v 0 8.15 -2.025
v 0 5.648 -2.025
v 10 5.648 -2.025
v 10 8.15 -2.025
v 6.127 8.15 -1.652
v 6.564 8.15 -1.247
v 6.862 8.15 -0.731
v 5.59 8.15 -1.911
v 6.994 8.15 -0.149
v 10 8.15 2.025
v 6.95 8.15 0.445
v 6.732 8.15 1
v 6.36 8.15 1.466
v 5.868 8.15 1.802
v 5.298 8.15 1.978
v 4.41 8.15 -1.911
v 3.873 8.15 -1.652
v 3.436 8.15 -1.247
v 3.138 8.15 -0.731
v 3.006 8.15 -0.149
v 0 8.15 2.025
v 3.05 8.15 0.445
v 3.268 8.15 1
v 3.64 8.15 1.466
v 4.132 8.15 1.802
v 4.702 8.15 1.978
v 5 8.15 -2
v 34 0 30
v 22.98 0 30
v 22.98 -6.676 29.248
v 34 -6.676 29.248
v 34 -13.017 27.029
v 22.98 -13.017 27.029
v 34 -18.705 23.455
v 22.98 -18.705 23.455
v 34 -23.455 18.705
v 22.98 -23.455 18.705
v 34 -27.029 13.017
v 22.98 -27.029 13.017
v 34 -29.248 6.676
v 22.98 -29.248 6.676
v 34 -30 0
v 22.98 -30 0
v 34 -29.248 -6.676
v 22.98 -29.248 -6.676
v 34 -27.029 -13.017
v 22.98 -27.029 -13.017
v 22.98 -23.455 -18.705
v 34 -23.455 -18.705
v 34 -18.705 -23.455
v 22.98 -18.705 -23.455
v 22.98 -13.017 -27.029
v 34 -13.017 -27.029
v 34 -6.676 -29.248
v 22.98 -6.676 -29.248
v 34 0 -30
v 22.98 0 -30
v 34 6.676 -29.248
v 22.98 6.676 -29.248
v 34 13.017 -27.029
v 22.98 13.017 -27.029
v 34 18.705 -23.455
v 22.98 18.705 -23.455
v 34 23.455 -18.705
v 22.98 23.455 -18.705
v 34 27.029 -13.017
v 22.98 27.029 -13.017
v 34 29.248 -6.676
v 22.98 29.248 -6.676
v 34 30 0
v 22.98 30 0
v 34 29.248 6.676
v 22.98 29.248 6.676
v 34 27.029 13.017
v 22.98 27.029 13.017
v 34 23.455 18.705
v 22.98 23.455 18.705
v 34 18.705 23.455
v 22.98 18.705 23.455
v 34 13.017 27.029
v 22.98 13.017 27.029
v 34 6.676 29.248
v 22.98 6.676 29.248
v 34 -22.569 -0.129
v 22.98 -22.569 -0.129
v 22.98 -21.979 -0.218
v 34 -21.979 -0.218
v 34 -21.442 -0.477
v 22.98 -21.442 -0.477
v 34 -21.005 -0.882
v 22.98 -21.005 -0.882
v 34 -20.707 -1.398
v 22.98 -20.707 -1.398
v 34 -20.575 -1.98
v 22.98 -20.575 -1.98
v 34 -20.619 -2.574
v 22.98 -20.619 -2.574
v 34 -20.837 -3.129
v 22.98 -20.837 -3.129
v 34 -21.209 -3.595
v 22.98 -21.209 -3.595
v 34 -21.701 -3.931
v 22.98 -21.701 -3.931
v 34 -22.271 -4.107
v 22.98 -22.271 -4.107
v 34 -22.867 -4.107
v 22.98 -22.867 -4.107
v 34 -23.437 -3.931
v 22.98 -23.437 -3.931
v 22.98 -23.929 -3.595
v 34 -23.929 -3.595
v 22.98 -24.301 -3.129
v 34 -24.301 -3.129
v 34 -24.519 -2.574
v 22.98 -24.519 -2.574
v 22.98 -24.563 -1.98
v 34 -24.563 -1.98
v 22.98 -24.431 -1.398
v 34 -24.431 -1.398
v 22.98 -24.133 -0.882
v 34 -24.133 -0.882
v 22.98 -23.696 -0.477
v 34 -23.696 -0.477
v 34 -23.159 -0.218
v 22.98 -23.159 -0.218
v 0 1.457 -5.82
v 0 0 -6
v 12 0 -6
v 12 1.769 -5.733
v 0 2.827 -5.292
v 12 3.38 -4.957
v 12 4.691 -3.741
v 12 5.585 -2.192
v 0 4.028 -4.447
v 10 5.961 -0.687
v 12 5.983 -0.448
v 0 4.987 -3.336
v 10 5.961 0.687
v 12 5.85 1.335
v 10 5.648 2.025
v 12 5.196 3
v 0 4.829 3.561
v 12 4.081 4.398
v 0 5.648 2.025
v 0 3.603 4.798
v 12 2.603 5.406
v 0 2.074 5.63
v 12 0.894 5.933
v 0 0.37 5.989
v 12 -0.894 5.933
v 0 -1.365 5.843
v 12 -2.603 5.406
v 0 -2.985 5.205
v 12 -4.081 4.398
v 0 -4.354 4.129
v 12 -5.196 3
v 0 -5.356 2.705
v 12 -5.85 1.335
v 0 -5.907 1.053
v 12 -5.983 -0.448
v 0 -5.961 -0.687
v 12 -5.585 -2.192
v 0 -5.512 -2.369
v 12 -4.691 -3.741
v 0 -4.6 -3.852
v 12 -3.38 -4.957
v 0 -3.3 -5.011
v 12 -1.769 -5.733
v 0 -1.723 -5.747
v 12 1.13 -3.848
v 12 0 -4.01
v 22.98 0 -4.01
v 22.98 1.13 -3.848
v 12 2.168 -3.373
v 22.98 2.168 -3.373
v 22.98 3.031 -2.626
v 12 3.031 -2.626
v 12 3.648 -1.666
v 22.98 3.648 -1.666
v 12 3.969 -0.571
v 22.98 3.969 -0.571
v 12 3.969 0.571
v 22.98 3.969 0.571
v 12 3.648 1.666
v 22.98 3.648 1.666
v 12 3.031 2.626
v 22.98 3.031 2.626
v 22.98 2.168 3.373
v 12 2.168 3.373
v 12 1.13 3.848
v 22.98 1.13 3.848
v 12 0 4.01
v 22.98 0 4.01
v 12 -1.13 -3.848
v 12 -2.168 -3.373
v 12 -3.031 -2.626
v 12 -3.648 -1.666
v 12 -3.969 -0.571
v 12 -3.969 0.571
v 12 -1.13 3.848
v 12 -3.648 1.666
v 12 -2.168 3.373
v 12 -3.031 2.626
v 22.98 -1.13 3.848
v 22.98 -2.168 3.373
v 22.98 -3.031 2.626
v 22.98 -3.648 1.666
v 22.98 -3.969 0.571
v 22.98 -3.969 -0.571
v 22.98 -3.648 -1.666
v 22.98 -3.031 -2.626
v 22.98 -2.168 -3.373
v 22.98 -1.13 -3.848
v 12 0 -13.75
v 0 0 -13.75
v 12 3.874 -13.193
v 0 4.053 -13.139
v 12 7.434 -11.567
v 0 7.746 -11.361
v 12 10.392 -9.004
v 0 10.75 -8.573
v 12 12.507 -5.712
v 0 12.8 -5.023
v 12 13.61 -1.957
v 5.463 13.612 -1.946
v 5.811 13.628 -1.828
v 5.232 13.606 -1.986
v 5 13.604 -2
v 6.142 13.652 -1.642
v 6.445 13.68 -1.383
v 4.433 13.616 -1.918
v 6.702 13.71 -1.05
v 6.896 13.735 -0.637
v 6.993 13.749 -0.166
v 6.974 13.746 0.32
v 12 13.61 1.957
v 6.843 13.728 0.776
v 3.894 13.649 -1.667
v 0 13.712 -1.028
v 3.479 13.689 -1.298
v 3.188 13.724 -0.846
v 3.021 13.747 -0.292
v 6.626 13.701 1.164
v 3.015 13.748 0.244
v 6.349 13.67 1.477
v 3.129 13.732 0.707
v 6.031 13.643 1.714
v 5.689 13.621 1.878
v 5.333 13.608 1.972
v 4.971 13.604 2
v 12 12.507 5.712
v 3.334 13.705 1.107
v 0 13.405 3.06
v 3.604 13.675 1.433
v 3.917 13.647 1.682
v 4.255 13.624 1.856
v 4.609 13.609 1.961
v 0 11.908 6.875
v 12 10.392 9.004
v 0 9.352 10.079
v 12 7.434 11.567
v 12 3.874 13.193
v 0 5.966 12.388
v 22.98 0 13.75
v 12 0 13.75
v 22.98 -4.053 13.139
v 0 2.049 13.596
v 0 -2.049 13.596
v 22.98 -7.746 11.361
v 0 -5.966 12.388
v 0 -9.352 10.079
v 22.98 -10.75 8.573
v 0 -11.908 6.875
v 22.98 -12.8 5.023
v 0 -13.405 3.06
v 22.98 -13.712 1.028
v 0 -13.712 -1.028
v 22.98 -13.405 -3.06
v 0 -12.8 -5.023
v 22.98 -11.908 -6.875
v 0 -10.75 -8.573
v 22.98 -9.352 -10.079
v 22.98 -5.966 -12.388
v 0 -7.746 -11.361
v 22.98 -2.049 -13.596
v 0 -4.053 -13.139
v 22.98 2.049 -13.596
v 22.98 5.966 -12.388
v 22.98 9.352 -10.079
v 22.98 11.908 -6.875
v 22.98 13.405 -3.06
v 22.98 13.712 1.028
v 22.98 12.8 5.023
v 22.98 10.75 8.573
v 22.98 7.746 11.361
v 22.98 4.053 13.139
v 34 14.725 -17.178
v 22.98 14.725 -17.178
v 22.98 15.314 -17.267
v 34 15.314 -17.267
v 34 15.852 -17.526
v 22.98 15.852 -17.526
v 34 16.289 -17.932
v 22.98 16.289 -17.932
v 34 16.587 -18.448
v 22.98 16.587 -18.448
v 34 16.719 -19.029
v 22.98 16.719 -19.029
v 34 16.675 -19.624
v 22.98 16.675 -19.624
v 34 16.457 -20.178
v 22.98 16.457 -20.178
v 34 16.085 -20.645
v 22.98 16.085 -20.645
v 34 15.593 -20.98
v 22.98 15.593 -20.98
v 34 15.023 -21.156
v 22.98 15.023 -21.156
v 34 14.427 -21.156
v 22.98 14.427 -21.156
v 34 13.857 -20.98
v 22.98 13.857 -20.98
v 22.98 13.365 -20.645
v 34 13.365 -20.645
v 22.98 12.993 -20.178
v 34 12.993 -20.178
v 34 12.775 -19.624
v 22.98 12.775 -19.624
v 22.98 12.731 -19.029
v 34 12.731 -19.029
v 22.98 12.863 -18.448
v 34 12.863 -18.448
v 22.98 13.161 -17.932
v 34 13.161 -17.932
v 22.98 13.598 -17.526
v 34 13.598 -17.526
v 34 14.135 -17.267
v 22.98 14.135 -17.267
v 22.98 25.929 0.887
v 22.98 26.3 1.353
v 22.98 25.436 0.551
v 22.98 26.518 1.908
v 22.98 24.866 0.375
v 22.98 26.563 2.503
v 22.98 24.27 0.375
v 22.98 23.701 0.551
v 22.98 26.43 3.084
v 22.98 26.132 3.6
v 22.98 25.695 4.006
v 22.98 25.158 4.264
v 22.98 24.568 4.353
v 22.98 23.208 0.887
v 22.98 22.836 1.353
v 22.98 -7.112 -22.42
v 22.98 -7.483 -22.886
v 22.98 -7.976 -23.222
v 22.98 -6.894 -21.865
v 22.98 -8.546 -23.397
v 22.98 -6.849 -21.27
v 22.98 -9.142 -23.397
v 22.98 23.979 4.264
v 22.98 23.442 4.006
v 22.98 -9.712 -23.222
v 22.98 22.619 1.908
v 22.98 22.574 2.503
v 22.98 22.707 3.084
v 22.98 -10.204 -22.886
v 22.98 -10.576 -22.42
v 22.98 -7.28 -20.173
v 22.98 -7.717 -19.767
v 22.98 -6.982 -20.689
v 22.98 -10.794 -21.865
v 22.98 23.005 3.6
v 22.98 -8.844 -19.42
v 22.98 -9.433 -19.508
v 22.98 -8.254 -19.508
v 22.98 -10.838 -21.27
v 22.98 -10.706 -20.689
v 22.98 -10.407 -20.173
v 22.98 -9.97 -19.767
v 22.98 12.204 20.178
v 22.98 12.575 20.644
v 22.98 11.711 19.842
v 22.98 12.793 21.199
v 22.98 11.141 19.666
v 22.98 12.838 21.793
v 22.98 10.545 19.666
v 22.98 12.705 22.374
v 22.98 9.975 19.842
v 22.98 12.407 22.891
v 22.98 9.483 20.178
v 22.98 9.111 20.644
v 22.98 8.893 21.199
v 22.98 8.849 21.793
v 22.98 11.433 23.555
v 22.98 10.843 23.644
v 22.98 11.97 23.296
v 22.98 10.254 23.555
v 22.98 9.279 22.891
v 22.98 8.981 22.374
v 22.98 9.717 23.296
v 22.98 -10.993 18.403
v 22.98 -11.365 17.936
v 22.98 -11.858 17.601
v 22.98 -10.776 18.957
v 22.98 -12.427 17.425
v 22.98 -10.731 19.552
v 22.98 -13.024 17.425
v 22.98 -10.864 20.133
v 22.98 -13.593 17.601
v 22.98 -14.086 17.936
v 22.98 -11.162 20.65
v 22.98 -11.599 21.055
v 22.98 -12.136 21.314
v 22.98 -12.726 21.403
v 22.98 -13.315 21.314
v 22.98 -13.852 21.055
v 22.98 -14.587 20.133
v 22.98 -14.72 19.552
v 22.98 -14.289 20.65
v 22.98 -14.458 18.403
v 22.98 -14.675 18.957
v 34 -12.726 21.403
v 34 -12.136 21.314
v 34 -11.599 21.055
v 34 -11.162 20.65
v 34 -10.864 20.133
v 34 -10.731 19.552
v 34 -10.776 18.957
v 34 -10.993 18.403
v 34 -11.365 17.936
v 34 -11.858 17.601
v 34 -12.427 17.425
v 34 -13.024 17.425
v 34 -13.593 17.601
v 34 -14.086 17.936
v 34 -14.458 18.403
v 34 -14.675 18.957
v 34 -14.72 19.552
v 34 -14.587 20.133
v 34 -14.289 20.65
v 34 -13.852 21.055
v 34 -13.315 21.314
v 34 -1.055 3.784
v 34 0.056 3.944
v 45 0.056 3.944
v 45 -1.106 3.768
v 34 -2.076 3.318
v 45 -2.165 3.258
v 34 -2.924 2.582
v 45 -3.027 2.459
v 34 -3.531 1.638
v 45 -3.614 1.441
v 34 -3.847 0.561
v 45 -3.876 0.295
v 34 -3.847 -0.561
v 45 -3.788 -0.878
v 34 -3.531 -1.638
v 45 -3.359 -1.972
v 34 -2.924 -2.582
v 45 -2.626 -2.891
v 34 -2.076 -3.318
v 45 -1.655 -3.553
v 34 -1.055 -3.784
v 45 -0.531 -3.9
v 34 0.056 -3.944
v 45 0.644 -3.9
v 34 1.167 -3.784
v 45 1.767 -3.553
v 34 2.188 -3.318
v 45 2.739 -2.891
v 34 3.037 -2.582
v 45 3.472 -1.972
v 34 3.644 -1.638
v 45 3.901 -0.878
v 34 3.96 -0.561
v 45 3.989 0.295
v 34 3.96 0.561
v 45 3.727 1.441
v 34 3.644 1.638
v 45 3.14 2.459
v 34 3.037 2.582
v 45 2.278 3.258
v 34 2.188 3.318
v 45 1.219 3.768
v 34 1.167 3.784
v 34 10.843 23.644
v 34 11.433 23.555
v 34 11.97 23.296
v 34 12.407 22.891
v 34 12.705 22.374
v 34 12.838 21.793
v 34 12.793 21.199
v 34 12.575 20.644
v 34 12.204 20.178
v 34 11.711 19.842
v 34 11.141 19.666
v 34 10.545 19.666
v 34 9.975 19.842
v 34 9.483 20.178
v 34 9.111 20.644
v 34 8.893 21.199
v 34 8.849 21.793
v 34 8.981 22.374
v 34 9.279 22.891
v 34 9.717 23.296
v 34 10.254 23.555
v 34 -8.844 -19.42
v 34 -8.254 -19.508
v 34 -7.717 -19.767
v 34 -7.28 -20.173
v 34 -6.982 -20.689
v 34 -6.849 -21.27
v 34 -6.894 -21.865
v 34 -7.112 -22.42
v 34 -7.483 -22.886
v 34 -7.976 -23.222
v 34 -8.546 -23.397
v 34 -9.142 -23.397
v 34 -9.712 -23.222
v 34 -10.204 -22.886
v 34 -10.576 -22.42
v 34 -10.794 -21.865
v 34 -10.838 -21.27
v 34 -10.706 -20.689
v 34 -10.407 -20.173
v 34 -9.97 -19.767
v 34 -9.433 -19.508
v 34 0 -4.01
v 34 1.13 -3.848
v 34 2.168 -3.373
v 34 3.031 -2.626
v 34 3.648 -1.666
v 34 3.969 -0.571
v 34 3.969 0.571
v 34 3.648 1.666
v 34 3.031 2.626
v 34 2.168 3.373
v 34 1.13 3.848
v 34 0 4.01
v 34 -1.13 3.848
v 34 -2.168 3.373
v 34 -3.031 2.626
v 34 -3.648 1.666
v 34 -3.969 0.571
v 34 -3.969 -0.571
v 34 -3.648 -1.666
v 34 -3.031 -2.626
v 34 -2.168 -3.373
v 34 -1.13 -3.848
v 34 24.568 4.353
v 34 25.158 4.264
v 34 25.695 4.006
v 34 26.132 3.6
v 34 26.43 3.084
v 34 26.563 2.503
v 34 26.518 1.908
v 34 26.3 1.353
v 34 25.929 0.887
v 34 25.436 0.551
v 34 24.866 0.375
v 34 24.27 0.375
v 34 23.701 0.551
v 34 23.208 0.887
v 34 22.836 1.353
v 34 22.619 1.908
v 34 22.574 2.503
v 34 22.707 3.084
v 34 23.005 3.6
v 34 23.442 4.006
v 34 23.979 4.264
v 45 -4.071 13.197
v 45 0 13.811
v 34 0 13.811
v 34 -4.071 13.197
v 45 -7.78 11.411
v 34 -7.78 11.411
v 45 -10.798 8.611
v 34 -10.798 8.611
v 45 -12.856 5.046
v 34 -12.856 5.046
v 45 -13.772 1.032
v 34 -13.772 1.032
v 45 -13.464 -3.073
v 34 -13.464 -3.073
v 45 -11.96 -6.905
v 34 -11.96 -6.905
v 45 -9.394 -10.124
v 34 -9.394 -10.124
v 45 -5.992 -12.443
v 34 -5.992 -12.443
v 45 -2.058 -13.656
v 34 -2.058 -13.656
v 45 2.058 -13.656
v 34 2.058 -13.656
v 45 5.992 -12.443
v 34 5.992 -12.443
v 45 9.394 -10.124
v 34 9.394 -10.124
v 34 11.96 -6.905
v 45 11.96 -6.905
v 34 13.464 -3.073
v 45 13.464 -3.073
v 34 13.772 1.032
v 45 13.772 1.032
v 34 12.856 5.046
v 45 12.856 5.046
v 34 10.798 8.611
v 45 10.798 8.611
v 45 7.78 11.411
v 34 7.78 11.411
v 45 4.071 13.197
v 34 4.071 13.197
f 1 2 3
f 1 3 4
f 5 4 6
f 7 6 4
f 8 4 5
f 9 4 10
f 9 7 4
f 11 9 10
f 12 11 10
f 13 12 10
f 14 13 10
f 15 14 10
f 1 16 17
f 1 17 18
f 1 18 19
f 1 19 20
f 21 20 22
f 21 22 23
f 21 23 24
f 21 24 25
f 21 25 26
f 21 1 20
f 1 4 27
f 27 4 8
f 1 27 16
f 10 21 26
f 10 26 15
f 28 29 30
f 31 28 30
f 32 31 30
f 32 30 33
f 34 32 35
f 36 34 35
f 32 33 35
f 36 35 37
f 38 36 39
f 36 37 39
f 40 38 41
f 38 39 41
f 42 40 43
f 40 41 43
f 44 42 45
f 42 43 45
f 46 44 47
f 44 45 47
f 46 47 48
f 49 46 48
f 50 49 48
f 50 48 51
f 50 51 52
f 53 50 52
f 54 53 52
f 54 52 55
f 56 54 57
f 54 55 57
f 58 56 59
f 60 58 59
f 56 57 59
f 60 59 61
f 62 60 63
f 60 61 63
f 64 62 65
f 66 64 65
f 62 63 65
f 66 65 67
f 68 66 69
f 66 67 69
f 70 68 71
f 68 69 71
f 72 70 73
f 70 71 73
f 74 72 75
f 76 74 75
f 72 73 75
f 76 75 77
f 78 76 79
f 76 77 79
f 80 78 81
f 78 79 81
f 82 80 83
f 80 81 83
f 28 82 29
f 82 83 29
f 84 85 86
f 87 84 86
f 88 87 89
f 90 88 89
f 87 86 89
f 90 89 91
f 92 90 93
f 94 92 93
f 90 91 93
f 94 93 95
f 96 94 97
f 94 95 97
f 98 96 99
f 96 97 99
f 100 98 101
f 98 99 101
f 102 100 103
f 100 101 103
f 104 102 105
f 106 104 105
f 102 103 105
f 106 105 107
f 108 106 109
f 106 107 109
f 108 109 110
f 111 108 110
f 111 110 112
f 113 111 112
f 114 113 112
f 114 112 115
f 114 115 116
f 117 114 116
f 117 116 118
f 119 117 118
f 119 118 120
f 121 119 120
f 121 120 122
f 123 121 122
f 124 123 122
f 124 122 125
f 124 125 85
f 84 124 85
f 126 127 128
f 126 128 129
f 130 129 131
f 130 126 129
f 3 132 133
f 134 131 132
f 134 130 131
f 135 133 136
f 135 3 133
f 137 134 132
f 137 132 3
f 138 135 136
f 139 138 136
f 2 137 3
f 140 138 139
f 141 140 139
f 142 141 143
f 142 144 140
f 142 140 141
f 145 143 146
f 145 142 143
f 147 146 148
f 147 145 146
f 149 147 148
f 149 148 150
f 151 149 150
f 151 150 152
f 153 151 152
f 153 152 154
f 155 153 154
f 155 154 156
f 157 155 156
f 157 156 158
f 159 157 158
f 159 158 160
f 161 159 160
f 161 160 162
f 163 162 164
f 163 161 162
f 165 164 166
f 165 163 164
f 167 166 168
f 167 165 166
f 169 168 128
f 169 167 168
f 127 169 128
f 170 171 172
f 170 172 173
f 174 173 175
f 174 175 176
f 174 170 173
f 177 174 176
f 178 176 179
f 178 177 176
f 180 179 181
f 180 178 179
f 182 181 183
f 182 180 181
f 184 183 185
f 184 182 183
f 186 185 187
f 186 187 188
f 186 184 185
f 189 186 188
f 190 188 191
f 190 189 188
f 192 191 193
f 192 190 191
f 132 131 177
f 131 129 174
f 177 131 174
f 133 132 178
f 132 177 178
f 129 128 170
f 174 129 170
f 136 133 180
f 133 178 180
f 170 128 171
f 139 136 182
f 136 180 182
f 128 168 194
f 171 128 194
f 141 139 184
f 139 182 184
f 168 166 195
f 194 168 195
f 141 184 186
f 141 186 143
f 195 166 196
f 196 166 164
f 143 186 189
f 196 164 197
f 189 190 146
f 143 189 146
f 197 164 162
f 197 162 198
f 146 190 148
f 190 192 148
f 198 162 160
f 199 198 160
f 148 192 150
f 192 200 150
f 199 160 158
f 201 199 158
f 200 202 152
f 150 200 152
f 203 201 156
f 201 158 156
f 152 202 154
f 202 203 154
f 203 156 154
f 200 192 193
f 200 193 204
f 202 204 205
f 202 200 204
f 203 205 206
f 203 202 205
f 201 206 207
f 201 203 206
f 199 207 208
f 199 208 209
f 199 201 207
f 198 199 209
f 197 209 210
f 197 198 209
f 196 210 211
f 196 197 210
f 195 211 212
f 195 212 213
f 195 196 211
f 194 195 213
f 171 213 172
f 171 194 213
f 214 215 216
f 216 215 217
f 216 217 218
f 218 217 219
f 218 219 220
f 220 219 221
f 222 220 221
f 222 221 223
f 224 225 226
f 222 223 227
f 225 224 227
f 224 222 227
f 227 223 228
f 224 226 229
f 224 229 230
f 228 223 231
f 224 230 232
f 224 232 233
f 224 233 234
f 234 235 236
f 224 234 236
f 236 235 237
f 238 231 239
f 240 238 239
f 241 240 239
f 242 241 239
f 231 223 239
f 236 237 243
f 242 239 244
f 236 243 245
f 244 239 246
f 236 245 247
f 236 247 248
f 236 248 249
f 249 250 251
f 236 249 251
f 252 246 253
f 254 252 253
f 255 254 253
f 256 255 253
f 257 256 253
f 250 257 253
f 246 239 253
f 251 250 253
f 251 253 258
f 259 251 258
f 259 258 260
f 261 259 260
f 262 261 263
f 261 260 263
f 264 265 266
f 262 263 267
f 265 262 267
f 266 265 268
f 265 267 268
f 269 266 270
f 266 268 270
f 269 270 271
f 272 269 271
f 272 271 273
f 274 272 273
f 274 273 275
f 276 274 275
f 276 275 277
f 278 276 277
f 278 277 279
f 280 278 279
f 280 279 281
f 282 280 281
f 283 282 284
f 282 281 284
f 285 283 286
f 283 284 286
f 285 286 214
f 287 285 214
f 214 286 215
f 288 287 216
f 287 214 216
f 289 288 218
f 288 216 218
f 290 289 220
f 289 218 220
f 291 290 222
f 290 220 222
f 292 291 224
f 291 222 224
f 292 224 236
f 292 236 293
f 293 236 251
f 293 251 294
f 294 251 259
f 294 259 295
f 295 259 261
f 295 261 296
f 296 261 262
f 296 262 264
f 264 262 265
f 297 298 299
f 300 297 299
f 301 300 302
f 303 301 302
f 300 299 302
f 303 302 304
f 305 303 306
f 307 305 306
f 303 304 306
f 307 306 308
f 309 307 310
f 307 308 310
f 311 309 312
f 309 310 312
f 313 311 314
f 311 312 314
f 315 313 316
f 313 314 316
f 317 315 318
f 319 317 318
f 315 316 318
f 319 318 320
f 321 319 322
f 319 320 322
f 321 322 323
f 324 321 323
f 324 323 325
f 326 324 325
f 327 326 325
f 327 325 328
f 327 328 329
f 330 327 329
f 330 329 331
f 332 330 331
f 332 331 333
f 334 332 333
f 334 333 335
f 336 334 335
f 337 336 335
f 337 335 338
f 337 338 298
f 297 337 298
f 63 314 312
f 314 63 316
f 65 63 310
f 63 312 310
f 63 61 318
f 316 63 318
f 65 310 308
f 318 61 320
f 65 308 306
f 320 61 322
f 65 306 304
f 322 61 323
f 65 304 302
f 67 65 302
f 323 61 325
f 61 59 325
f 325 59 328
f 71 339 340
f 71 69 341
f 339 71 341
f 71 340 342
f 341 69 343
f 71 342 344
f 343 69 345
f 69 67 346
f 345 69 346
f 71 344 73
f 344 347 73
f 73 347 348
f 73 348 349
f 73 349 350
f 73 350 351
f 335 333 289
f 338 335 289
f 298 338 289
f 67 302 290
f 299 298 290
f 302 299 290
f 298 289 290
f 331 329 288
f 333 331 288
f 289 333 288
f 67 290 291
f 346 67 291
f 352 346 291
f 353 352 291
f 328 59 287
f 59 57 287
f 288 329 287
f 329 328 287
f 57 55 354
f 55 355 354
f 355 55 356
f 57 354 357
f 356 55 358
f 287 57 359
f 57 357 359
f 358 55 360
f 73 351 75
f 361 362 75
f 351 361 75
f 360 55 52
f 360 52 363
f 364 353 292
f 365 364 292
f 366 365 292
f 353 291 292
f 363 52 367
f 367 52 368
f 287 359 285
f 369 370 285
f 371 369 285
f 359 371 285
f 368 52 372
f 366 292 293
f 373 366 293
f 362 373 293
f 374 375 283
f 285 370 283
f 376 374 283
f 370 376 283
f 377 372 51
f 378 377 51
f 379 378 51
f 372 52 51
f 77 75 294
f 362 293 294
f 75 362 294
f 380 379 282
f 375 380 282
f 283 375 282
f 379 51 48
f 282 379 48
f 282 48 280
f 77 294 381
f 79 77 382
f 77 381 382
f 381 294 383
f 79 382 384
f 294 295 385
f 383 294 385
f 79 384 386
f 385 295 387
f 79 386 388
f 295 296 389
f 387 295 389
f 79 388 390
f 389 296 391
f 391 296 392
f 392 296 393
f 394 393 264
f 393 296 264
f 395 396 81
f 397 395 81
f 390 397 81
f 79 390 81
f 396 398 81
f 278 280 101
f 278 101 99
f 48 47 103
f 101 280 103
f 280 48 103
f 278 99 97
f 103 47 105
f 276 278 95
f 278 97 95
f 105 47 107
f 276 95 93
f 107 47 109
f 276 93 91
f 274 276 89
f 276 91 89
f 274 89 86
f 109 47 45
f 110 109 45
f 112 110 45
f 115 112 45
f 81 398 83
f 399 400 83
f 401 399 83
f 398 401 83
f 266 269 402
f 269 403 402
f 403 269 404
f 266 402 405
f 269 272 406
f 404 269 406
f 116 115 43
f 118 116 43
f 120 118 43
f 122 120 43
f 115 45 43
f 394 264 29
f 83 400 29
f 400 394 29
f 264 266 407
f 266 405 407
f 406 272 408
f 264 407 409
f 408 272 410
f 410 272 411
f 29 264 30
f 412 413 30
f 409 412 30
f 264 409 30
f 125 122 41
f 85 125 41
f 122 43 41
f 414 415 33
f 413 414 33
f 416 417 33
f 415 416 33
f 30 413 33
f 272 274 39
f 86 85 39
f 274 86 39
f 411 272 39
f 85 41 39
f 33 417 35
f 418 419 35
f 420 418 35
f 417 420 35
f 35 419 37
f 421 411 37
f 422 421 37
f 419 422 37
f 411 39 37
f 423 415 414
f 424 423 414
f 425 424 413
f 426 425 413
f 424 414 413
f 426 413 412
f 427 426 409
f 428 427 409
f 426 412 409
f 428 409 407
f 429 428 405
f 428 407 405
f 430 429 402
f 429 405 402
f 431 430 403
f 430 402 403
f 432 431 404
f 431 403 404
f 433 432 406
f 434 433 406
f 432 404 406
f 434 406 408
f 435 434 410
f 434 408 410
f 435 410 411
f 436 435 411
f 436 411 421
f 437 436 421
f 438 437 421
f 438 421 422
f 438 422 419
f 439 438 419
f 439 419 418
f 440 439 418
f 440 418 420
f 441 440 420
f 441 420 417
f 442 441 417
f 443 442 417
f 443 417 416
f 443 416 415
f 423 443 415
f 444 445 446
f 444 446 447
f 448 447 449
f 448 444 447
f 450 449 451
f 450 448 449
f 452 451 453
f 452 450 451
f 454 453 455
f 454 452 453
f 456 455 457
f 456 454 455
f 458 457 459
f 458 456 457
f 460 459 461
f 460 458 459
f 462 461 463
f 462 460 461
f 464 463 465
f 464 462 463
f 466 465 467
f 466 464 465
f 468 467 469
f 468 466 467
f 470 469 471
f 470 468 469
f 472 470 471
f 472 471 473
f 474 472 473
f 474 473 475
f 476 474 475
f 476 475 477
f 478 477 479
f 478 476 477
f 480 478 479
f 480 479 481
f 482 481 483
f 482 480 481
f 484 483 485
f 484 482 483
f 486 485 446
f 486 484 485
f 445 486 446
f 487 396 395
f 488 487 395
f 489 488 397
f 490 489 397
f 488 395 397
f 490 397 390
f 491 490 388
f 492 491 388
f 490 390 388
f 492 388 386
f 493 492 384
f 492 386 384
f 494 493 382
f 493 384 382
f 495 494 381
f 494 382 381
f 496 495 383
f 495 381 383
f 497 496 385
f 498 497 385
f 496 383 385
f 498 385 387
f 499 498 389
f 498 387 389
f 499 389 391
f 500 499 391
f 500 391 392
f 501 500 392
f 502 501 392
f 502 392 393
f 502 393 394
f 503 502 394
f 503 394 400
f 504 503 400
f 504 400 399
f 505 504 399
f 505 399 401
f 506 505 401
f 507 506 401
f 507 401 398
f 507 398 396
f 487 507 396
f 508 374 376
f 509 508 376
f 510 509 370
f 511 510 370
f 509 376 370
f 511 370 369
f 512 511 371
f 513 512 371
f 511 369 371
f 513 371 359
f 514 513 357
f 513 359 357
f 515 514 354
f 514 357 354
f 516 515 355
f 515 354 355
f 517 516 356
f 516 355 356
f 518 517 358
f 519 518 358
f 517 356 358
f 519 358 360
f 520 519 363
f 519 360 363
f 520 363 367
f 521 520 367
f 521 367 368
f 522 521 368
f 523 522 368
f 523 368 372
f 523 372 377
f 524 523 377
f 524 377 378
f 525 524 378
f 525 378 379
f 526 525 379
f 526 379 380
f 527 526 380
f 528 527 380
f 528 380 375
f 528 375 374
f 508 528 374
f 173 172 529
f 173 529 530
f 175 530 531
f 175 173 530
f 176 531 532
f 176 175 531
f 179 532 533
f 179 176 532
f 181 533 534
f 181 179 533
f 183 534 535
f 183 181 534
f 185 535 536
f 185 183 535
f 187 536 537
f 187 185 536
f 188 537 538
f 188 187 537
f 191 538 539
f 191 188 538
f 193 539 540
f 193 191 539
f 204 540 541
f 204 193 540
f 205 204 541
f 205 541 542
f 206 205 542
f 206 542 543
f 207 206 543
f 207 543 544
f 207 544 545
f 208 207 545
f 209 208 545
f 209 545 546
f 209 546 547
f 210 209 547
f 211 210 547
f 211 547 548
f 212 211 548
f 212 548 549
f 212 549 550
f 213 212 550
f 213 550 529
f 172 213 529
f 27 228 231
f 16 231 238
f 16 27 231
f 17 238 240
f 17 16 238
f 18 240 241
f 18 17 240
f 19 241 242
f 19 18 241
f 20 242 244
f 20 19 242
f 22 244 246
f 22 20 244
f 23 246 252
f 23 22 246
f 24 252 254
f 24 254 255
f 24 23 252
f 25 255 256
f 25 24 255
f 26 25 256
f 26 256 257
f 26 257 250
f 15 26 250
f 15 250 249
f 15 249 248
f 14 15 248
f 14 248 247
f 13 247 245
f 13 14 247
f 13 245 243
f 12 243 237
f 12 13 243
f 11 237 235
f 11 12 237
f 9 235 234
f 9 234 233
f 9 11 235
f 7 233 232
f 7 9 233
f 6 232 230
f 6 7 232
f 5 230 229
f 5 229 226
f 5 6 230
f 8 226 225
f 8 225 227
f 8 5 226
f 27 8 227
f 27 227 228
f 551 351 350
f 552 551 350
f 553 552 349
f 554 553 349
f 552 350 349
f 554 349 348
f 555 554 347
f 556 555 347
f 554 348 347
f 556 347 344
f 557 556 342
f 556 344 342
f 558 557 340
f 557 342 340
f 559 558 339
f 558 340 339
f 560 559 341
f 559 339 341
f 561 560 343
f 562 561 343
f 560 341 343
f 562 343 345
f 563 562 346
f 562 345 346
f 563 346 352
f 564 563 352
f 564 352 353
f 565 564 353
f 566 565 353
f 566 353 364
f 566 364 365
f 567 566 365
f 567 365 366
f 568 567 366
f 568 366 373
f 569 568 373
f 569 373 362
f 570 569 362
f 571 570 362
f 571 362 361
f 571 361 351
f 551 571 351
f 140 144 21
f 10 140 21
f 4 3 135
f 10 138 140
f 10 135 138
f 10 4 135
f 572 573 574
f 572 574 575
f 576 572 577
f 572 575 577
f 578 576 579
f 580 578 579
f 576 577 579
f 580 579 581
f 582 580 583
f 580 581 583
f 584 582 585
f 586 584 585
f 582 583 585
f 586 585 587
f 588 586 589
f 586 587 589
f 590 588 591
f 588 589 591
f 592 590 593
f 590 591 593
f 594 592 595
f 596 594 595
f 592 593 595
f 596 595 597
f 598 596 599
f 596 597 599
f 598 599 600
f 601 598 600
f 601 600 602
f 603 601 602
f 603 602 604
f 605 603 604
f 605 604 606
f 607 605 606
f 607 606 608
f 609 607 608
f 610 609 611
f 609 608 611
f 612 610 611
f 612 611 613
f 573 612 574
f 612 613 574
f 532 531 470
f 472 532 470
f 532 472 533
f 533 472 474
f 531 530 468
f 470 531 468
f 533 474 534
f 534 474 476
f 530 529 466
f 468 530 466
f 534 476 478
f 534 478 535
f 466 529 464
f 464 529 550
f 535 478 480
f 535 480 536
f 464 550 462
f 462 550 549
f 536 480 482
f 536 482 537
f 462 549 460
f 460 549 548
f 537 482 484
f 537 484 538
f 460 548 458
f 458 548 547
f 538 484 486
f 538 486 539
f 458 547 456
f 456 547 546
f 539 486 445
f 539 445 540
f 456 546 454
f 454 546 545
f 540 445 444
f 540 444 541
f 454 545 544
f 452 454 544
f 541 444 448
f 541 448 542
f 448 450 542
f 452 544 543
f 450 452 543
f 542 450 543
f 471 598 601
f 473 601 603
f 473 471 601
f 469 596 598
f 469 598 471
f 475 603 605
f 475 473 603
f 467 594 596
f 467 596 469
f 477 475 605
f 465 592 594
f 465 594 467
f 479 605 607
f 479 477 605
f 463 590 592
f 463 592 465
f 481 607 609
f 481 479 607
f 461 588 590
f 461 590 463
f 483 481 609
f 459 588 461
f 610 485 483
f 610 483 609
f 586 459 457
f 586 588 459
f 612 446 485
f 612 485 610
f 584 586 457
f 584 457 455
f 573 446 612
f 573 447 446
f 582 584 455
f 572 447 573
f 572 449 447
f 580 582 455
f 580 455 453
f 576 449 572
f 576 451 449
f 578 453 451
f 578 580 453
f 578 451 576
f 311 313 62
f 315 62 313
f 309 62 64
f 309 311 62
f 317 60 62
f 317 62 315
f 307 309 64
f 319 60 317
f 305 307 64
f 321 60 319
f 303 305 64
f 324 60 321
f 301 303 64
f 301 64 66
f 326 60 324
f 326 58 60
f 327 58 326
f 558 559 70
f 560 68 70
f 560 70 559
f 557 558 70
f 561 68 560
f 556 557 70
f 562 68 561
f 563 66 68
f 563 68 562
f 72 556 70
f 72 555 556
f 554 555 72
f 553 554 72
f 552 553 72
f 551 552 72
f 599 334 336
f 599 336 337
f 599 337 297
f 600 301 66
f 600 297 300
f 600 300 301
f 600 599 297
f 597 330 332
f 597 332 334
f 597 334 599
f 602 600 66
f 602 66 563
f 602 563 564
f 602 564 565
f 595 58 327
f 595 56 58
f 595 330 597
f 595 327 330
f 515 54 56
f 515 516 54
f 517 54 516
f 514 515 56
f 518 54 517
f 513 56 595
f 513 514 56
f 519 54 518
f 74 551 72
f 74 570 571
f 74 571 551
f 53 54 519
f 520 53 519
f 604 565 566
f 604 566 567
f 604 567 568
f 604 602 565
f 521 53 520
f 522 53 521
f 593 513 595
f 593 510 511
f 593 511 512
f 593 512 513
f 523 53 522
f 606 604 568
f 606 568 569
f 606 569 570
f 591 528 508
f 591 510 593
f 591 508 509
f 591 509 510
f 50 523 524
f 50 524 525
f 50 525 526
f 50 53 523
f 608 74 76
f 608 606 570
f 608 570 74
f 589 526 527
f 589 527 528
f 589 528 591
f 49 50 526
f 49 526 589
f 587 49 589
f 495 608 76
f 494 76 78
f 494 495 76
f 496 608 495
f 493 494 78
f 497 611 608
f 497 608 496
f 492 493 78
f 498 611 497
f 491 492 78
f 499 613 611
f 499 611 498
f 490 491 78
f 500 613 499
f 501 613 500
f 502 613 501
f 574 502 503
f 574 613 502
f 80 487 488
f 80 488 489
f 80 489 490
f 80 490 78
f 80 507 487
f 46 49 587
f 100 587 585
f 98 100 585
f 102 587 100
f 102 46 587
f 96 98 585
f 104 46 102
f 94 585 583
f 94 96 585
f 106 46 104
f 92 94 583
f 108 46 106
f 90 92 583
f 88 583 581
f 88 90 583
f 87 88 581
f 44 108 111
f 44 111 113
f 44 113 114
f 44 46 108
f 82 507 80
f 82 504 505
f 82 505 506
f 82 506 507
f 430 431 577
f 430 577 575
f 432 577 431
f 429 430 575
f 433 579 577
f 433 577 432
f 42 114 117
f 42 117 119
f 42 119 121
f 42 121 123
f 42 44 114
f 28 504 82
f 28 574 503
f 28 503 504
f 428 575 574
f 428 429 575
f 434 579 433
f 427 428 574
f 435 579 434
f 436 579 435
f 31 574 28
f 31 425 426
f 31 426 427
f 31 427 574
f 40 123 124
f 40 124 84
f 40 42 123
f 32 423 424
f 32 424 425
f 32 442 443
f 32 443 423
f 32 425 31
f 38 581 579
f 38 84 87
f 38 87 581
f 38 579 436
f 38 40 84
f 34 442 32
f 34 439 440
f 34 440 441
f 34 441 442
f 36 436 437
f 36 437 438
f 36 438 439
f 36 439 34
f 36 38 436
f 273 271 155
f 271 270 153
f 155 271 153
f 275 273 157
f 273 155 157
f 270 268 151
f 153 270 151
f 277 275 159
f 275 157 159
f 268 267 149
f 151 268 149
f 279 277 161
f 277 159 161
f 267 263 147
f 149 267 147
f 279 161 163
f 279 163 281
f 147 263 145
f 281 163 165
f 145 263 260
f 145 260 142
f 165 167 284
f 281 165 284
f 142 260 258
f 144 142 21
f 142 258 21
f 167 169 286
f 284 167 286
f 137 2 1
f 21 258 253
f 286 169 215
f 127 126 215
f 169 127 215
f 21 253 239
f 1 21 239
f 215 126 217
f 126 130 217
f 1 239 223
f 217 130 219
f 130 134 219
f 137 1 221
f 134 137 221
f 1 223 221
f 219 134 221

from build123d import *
from build123d.topology import SkipClean

# Parameters (mm, degrees)
SKETCH1_R                 = 13.75
SKETCH1_R_2               = 6
BOSS_EXTRUDE1_DEPTH       = 12
SKETCH2_R                 = 13.75
SKETCH2_R_2               = 4.01
BOSS_EXTRUDE3_DEPTH       = 10.98
SKETCH3_R                 = 30
BOSS_EXTRUDE4_DEPTH       = 11.02
F_4_0MM_DOWEL_HOLE1_D     = 4
F_4_0MM_DOWEL_HOLE1_DEPTH = 25.4
F_4_0MM_DOWEL_HOLE1_TIP   = 1.201721238
SKETCH11_W                = 4.05
SKETCH11_H                = 4.3
CUT_EXTRUDE1_DEPTH        = 10
CUT_EXTRUDE2_START        = -32
SKETCH15_R                = 4.01
CUT_EXTRUDE2_DEPTH        = 32
SKETCH16_R                = 13.810706785
SKETCH16_R_2              = 3.943549935
BOSS_EXTRUDE5_DEPTH       = 11


with BuildPart() as part:
    # Sketch1 → Boss-Extrude1 (new body)
    with BuildSketch(Plane(origin=(0, 0, 0), x_dir=(0, 0, -1), z_dir=(1, 0, 0))):
        Circle(SKETCH1_R)
        Circle(SKETCH1_R_2, mode=Mode.SUBTRACT)
    extrude(amount=BOSS_EXTRUDE1_DEPTH)

    # Sketch2 → Boss-Extrude3 (add)
    with BuildSketch(Plane(origin=(12, 0, 0), x_dir=(0, 0, -1), z_dir=(1, 0, 0))):
        with Locations(Location((0, 0, 0), (0, 0, 180))):
            Circle(SKETCH2_R)
        with Locations(Location((0, 0, 0), (0, 0, 180))):
            Circle(SKETCH2_R_2, mode=Mode.SUBTRACT)
    extrude(amount=BOSS_EXTRUDE3_DEPTH)

    # Sketch3 → Boss-Extrude4 (add)
    with BuildSketch(Plane(origin=(22.98, 0, 0), x_dir=(0, 0, -1), z_dir=(1, 0, 0))):
        with Locations(Location((0, 0, 0), (0, 0, 180))):
            Circle(SKETCH3_R)
    extrude(amount=BOSS_EXTRUDE4_DEPTH)

    # Ø4.0mm Dowel Hole1
    with Locations(Plane(origin=(34, 0, 0), x_dir=(0, 0, -1), z_dir=(1, 0, 0))):
        with Locations((-21.643670313, 10.843162234), (-2.353154811, 24.568381237), (19.178491269, 14.724914261), (21.419621846, -8.843771717), (-19.402539736, -12.725523744), (2.129106344, -22.56899072)):
            Hole(F_4_0MM_DOWEL_HOLE1_D / 2, depth=F_4_0MM_DOWEL_HOLE1_DEPTH)
            with Locations((0, 0, -(F_4_0MM_DOWEL_HOLE1_DEPTH + F_4_0MM_DOWEL_HOLE1_TIP / 2))):  # 118° drill point
                Cone(0, F_4_0MM_DOWEL_HOLE1_D / 2, F_4_0MM_DOWEL_HOLE1_TIP, mode=Mode.SUBTRACT)

    # Sketch11 → Cut-Extrude1 (cut)
    with BuildSketch(Plane.ZY):
        with Locations((0, 6)):
            Rectangle(SKETCH11_W, SKETCH11_H)
    extrude(amount=-CUT_EXTRUDE1_DEPTH, mode=Mode.SUBTRACT)

    # Sketch14 → Ø4.0mm Dowel Hole2 (revolve, cut)
    with BuildSketch(Plane(origin=(5, 8.15, 0), x_dir=(0, 0, -1), z_dir=(1, 0, 0))):
        Polygon((0, 0), (0, 26.601721238), (2, 25.4), (2, 0), align=None)
    revolve(axis=Axis((5, 1.8, 0), (0, 1, 0)), mode=Mode.SUBTRACT)

    # Sketch15 → Cut-Extrude2 (cut)
    with SkipClean():  # the faces are left unmerged after this step: merging them gives an invalid solid
        with BuildSketch(Plane(origin=(34, 0, 0), x_dir=(0, 0, -1), z_dir=(1, 0, 0)).offset(CUT_EXTRUDE2_START)):
            Circle(SKETCH15_R)
        extrude(amount=CUT_EXTRUDE2_DEPTH, mode=Mode.SUBTRACT)
    add(part.part.scale(1), mode=Mode.REPLACE)  # the faces are merged on a copy

    # Sketch16 → Boss-Extrude5 (add)
    with BuildSketch(Plane(origin=(34, 0, 0), x_dir=(0, 0, -1), z_dir=(1, 0, 0))):
        with Locations(Location((0, 0, 0), (0, 0, 180))):
            Circle(SKETCH16_R)
        with Locations(Location((0, 0.056450065, 0), (0, 0, 180))):
            Circle(SKETCH16_R_2, mode=Mode.SUBTRACT)
    extrude(amount=BOSS_EXTRUDE5_DEPTH)


solid = part.part
